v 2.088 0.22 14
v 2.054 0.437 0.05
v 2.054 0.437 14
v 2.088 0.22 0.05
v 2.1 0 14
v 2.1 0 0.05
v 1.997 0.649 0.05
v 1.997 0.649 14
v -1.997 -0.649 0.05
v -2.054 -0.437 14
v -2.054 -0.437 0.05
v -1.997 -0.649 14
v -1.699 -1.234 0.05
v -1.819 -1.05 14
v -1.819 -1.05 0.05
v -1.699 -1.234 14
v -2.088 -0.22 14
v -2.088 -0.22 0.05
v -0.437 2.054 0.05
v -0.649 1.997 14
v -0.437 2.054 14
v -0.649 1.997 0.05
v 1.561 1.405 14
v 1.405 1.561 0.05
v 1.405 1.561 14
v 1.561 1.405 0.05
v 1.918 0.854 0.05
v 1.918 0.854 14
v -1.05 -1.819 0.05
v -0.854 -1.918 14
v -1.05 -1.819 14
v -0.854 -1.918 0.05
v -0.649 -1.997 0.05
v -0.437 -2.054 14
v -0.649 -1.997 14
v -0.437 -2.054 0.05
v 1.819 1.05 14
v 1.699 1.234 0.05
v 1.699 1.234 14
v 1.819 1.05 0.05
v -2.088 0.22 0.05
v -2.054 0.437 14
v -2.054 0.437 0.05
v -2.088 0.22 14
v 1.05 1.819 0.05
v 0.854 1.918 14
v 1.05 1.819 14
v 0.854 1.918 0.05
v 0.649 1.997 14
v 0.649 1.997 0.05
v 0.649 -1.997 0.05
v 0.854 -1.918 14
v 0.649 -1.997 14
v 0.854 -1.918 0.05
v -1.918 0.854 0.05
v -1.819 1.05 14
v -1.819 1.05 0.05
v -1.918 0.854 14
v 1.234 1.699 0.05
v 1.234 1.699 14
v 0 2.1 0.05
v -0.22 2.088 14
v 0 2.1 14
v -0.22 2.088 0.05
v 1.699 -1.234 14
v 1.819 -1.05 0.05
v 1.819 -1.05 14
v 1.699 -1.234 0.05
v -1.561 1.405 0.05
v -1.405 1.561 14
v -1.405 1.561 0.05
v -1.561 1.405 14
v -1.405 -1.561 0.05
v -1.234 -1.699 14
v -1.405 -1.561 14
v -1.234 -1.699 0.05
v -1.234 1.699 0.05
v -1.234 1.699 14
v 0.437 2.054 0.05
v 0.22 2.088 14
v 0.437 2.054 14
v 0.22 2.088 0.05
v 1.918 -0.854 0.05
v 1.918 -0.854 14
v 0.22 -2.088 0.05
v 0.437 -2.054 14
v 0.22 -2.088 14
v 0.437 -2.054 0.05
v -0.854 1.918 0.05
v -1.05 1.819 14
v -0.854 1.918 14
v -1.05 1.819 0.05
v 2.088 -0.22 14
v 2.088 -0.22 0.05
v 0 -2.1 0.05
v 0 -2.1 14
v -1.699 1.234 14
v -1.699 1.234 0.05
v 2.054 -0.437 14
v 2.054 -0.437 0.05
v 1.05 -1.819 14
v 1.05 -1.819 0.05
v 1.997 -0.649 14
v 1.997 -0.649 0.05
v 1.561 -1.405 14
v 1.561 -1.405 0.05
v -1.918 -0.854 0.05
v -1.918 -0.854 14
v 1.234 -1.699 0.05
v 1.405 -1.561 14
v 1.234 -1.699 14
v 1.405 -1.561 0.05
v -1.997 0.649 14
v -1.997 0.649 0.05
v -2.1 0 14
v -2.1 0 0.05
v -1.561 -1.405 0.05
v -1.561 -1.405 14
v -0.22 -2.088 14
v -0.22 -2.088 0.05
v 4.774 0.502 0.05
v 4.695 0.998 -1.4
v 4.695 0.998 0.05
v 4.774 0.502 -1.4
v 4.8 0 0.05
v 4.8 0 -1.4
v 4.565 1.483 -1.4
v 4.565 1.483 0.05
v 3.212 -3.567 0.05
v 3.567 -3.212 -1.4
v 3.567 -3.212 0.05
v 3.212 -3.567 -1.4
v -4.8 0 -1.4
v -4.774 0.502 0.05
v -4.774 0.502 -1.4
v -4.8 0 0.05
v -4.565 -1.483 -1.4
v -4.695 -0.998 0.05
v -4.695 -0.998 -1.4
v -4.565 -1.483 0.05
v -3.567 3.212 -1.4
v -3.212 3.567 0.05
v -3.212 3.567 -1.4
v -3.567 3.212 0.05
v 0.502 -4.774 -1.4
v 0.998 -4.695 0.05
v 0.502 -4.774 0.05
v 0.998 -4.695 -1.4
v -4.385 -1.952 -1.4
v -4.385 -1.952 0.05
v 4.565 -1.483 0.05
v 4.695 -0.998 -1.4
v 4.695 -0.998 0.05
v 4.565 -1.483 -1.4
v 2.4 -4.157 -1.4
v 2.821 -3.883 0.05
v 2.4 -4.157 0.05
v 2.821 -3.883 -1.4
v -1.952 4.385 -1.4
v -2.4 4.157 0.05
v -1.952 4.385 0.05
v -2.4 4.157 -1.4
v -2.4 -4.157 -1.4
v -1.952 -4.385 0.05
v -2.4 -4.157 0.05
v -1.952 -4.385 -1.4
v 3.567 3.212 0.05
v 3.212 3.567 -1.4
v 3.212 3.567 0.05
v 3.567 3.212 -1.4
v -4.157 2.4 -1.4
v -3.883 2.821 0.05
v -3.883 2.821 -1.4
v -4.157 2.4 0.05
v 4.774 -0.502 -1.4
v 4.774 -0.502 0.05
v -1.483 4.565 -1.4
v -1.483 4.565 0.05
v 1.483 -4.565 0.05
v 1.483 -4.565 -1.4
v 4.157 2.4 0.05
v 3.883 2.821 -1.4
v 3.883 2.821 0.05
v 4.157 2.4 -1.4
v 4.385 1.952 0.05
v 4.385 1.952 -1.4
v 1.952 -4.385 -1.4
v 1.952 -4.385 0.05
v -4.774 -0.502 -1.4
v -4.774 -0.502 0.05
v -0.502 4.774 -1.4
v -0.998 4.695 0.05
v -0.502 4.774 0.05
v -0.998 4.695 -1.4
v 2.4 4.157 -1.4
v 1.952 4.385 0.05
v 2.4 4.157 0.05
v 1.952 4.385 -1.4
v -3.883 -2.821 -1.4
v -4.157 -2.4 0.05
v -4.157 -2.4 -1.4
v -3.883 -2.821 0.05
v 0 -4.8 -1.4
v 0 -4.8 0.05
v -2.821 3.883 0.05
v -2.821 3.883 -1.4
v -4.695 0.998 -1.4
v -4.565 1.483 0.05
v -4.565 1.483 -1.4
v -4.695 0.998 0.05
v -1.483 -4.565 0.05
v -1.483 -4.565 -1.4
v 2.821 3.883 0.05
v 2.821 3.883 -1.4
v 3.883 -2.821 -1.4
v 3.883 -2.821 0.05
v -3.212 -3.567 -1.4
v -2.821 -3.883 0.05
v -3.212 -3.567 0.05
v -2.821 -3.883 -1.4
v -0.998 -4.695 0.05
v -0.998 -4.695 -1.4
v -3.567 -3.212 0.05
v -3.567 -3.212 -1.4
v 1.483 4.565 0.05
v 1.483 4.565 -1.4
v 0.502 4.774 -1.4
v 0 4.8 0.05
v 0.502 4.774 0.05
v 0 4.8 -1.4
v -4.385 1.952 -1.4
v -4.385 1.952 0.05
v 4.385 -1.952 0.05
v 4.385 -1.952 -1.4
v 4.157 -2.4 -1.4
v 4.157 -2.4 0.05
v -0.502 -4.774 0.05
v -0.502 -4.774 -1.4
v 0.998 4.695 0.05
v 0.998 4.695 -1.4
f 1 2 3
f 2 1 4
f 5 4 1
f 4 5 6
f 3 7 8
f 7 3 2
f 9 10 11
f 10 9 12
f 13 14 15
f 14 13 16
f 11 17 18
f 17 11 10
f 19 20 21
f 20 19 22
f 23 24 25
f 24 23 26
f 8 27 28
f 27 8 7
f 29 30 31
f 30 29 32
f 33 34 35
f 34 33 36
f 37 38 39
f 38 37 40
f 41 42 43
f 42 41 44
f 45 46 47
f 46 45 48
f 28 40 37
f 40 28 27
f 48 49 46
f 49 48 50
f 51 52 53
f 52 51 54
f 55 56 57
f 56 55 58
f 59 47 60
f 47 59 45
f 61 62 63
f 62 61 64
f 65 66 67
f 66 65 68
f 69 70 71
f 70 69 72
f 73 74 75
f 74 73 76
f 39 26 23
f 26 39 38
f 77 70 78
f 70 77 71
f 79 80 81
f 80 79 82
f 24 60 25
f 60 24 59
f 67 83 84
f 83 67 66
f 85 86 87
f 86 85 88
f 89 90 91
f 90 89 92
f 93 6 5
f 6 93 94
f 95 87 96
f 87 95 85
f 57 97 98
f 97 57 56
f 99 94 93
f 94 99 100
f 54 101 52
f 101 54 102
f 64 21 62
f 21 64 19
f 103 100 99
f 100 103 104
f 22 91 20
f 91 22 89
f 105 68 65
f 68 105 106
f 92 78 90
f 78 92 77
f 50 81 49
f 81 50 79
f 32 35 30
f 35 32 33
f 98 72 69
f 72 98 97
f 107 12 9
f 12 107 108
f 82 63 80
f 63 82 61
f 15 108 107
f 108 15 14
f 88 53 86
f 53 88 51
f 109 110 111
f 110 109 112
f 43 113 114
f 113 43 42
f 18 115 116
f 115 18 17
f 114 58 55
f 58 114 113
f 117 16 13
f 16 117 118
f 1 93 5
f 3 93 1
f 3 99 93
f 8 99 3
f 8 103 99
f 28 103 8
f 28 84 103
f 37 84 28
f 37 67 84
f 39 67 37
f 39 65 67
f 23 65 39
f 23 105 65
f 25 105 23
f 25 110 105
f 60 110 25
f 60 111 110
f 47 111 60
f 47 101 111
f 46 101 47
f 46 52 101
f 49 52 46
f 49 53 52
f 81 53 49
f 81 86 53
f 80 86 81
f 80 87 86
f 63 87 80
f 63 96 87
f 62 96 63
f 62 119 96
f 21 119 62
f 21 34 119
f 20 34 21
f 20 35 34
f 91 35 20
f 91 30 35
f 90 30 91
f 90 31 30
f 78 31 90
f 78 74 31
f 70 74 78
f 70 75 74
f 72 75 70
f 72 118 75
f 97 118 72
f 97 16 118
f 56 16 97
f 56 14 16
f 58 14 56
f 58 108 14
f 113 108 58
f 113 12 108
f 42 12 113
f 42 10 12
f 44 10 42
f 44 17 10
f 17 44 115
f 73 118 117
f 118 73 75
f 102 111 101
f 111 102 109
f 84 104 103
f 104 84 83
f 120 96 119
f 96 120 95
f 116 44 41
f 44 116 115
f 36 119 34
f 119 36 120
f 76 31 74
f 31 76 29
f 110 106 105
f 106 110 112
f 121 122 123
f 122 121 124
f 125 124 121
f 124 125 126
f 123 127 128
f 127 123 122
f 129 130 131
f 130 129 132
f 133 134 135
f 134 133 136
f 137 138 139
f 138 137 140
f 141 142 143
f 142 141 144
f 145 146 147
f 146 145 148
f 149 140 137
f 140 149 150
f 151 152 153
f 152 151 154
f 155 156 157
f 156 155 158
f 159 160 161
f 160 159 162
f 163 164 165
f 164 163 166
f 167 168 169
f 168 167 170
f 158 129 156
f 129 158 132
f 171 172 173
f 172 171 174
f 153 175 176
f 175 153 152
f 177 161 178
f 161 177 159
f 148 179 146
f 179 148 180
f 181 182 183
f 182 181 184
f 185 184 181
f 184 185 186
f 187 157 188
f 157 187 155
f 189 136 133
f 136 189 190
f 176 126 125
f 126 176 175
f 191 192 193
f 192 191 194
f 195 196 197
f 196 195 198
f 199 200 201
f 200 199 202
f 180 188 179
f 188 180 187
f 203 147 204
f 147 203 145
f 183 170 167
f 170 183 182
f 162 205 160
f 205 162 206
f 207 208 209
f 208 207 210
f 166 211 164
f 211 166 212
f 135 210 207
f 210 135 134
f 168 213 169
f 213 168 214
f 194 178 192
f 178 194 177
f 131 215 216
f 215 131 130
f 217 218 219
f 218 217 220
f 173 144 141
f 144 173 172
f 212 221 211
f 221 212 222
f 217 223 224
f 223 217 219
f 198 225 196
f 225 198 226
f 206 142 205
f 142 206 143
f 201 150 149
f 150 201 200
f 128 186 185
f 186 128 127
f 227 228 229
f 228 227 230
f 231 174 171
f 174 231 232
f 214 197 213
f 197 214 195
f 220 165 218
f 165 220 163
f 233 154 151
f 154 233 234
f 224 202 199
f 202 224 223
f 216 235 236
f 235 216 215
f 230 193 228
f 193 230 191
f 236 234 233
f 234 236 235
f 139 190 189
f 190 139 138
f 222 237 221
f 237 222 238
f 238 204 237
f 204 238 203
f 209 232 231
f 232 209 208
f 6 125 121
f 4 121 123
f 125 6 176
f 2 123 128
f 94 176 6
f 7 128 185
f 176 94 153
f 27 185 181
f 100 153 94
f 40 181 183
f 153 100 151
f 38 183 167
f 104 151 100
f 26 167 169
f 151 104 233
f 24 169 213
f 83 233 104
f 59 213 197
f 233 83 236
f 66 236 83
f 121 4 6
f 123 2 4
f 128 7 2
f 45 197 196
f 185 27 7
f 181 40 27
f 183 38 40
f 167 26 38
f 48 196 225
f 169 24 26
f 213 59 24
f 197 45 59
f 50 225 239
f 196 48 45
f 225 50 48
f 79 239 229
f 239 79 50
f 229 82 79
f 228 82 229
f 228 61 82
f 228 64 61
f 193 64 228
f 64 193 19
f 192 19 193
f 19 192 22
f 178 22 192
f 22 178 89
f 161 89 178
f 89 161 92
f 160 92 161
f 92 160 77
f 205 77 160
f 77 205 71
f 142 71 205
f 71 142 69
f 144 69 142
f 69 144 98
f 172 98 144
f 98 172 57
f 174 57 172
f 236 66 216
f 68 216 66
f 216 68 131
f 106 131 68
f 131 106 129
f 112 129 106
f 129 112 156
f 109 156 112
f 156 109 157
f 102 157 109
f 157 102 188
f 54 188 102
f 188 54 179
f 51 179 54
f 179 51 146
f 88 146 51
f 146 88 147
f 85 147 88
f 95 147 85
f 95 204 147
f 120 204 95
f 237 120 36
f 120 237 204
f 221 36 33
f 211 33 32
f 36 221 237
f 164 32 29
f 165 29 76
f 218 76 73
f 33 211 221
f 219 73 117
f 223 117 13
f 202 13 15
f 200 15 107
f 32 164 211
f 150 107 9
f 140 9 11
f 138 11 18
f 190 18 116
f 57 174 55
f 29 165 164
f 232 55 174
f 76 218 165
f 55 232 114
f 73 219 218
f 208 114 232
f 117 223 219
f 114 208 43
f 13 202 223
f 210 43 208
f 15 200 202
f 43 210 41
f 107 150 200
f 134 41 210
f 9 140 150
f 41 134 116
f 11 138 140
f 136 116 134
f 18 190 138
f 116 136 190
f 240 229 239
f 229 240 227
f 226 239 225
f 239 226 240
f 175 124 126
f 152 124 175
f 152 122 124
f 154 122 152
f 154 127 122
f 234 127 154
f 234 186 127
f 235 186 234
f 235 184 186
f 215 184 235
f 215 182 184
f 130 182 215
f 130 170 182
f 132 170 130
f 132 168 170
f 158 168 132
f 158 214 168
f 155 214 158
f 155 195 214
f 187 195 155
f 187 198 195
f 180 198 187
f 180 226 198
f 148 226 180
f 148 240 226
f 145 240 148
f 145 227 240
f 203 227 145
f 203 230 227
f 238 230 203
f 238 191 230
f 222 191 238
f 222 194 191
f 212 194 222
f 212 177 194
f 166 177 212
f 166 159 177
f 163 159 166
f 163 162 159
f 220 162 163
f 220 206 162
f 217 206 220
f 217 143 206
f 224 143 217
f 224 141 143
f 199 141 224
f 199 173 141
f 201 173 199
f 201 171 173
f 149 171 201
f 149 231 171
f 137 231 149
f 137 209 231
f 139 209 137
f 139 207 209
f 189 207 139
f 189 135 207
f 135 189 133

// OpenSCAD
// file: config.scad
// config.scad - Shared Dimensions & Configuration

$fn = 60;

// ENCLOSURE DIMENSIONS (mm)
box_w = 240;   // Width (X)
box_d = 145;   // Depth (Y)
box_h = 140;   // Height (Z)
wall  = 2.8;   // Wall thickness
corner_r = 10; // Vintage rounded corner radius

// PREVIEW COLOR
wood_color = [0.35, 0.20, 0.10];

// SPEAKER BAY
spk_hole_dia   = 80;   // Front sound cutout
spk_bay_dia    = 112;  // Internal clearance
spk_bay_depth  = 100;
spk_x = 62.5;
spk_z = box_h / 2;

// 1602 LCD WINDOW
lcd_win_w = 72;
lcd_win_h = 25;
lcd_x     = 180;
lcd_z     = 105;

// CONTROLS
pot_x     = 155;
pot_z     = 35;
pot_hole  = 7.2;

btn_x     = 205;
btn_z     = 35;

// Button plunger & guide sleeve
btn_cap_dia           = 10;
btn_cap_recess_depth  = 1.6;
btn_shaft_hole_dia    = 4.6;
btn_sleeve_od         = 8.0;
btn_sleeve_len        = 6.0;
btn_switch_pad_w      = 8.0;
btn_switch_pad_d      = 8.0;
btn_switch_standoff_h = 8.0;

btn_plunger_shaft_len = 14;
btn_plunger_shaft_dia = 4.2;
btn_plunger_cap_h     = 1.4;

// REAR POWER CUTOUT (USB-C)
pwr_w = 14;
pwr_h = 9;
pwr_z = 18;

// INTERNAL MOUNTING STANDOFFS
// Raspberry Pi
pi_x = 8;
pi_y = 103;
pi_w = 110;
pi_d = 35;

// Arduino
ard_x = 150;
ard_y = 80;
ard_w = 65;
ard_d = 50;
ard_standoff_h = 5;

// USB Hub
hub_x = 130;
hub_y = 40;
hub_w = 100;
hub_d = 30;
hub_riser_h = 20;
// main file
 // button_plunger.scad - Standalone Button Plunger

include <config.scad>

module button_plunger() {
    cylinder(d = btn_plunger_shaft_dia, h = btn_plunger_shaft_len);
    translate([0, 0, -btn_plunger_cap_h])
        cylinder(d = btn_cap_dia - 0.4, h = btn_plunger_cap_h + 0.05);
}

// Render self
button_plunger();
